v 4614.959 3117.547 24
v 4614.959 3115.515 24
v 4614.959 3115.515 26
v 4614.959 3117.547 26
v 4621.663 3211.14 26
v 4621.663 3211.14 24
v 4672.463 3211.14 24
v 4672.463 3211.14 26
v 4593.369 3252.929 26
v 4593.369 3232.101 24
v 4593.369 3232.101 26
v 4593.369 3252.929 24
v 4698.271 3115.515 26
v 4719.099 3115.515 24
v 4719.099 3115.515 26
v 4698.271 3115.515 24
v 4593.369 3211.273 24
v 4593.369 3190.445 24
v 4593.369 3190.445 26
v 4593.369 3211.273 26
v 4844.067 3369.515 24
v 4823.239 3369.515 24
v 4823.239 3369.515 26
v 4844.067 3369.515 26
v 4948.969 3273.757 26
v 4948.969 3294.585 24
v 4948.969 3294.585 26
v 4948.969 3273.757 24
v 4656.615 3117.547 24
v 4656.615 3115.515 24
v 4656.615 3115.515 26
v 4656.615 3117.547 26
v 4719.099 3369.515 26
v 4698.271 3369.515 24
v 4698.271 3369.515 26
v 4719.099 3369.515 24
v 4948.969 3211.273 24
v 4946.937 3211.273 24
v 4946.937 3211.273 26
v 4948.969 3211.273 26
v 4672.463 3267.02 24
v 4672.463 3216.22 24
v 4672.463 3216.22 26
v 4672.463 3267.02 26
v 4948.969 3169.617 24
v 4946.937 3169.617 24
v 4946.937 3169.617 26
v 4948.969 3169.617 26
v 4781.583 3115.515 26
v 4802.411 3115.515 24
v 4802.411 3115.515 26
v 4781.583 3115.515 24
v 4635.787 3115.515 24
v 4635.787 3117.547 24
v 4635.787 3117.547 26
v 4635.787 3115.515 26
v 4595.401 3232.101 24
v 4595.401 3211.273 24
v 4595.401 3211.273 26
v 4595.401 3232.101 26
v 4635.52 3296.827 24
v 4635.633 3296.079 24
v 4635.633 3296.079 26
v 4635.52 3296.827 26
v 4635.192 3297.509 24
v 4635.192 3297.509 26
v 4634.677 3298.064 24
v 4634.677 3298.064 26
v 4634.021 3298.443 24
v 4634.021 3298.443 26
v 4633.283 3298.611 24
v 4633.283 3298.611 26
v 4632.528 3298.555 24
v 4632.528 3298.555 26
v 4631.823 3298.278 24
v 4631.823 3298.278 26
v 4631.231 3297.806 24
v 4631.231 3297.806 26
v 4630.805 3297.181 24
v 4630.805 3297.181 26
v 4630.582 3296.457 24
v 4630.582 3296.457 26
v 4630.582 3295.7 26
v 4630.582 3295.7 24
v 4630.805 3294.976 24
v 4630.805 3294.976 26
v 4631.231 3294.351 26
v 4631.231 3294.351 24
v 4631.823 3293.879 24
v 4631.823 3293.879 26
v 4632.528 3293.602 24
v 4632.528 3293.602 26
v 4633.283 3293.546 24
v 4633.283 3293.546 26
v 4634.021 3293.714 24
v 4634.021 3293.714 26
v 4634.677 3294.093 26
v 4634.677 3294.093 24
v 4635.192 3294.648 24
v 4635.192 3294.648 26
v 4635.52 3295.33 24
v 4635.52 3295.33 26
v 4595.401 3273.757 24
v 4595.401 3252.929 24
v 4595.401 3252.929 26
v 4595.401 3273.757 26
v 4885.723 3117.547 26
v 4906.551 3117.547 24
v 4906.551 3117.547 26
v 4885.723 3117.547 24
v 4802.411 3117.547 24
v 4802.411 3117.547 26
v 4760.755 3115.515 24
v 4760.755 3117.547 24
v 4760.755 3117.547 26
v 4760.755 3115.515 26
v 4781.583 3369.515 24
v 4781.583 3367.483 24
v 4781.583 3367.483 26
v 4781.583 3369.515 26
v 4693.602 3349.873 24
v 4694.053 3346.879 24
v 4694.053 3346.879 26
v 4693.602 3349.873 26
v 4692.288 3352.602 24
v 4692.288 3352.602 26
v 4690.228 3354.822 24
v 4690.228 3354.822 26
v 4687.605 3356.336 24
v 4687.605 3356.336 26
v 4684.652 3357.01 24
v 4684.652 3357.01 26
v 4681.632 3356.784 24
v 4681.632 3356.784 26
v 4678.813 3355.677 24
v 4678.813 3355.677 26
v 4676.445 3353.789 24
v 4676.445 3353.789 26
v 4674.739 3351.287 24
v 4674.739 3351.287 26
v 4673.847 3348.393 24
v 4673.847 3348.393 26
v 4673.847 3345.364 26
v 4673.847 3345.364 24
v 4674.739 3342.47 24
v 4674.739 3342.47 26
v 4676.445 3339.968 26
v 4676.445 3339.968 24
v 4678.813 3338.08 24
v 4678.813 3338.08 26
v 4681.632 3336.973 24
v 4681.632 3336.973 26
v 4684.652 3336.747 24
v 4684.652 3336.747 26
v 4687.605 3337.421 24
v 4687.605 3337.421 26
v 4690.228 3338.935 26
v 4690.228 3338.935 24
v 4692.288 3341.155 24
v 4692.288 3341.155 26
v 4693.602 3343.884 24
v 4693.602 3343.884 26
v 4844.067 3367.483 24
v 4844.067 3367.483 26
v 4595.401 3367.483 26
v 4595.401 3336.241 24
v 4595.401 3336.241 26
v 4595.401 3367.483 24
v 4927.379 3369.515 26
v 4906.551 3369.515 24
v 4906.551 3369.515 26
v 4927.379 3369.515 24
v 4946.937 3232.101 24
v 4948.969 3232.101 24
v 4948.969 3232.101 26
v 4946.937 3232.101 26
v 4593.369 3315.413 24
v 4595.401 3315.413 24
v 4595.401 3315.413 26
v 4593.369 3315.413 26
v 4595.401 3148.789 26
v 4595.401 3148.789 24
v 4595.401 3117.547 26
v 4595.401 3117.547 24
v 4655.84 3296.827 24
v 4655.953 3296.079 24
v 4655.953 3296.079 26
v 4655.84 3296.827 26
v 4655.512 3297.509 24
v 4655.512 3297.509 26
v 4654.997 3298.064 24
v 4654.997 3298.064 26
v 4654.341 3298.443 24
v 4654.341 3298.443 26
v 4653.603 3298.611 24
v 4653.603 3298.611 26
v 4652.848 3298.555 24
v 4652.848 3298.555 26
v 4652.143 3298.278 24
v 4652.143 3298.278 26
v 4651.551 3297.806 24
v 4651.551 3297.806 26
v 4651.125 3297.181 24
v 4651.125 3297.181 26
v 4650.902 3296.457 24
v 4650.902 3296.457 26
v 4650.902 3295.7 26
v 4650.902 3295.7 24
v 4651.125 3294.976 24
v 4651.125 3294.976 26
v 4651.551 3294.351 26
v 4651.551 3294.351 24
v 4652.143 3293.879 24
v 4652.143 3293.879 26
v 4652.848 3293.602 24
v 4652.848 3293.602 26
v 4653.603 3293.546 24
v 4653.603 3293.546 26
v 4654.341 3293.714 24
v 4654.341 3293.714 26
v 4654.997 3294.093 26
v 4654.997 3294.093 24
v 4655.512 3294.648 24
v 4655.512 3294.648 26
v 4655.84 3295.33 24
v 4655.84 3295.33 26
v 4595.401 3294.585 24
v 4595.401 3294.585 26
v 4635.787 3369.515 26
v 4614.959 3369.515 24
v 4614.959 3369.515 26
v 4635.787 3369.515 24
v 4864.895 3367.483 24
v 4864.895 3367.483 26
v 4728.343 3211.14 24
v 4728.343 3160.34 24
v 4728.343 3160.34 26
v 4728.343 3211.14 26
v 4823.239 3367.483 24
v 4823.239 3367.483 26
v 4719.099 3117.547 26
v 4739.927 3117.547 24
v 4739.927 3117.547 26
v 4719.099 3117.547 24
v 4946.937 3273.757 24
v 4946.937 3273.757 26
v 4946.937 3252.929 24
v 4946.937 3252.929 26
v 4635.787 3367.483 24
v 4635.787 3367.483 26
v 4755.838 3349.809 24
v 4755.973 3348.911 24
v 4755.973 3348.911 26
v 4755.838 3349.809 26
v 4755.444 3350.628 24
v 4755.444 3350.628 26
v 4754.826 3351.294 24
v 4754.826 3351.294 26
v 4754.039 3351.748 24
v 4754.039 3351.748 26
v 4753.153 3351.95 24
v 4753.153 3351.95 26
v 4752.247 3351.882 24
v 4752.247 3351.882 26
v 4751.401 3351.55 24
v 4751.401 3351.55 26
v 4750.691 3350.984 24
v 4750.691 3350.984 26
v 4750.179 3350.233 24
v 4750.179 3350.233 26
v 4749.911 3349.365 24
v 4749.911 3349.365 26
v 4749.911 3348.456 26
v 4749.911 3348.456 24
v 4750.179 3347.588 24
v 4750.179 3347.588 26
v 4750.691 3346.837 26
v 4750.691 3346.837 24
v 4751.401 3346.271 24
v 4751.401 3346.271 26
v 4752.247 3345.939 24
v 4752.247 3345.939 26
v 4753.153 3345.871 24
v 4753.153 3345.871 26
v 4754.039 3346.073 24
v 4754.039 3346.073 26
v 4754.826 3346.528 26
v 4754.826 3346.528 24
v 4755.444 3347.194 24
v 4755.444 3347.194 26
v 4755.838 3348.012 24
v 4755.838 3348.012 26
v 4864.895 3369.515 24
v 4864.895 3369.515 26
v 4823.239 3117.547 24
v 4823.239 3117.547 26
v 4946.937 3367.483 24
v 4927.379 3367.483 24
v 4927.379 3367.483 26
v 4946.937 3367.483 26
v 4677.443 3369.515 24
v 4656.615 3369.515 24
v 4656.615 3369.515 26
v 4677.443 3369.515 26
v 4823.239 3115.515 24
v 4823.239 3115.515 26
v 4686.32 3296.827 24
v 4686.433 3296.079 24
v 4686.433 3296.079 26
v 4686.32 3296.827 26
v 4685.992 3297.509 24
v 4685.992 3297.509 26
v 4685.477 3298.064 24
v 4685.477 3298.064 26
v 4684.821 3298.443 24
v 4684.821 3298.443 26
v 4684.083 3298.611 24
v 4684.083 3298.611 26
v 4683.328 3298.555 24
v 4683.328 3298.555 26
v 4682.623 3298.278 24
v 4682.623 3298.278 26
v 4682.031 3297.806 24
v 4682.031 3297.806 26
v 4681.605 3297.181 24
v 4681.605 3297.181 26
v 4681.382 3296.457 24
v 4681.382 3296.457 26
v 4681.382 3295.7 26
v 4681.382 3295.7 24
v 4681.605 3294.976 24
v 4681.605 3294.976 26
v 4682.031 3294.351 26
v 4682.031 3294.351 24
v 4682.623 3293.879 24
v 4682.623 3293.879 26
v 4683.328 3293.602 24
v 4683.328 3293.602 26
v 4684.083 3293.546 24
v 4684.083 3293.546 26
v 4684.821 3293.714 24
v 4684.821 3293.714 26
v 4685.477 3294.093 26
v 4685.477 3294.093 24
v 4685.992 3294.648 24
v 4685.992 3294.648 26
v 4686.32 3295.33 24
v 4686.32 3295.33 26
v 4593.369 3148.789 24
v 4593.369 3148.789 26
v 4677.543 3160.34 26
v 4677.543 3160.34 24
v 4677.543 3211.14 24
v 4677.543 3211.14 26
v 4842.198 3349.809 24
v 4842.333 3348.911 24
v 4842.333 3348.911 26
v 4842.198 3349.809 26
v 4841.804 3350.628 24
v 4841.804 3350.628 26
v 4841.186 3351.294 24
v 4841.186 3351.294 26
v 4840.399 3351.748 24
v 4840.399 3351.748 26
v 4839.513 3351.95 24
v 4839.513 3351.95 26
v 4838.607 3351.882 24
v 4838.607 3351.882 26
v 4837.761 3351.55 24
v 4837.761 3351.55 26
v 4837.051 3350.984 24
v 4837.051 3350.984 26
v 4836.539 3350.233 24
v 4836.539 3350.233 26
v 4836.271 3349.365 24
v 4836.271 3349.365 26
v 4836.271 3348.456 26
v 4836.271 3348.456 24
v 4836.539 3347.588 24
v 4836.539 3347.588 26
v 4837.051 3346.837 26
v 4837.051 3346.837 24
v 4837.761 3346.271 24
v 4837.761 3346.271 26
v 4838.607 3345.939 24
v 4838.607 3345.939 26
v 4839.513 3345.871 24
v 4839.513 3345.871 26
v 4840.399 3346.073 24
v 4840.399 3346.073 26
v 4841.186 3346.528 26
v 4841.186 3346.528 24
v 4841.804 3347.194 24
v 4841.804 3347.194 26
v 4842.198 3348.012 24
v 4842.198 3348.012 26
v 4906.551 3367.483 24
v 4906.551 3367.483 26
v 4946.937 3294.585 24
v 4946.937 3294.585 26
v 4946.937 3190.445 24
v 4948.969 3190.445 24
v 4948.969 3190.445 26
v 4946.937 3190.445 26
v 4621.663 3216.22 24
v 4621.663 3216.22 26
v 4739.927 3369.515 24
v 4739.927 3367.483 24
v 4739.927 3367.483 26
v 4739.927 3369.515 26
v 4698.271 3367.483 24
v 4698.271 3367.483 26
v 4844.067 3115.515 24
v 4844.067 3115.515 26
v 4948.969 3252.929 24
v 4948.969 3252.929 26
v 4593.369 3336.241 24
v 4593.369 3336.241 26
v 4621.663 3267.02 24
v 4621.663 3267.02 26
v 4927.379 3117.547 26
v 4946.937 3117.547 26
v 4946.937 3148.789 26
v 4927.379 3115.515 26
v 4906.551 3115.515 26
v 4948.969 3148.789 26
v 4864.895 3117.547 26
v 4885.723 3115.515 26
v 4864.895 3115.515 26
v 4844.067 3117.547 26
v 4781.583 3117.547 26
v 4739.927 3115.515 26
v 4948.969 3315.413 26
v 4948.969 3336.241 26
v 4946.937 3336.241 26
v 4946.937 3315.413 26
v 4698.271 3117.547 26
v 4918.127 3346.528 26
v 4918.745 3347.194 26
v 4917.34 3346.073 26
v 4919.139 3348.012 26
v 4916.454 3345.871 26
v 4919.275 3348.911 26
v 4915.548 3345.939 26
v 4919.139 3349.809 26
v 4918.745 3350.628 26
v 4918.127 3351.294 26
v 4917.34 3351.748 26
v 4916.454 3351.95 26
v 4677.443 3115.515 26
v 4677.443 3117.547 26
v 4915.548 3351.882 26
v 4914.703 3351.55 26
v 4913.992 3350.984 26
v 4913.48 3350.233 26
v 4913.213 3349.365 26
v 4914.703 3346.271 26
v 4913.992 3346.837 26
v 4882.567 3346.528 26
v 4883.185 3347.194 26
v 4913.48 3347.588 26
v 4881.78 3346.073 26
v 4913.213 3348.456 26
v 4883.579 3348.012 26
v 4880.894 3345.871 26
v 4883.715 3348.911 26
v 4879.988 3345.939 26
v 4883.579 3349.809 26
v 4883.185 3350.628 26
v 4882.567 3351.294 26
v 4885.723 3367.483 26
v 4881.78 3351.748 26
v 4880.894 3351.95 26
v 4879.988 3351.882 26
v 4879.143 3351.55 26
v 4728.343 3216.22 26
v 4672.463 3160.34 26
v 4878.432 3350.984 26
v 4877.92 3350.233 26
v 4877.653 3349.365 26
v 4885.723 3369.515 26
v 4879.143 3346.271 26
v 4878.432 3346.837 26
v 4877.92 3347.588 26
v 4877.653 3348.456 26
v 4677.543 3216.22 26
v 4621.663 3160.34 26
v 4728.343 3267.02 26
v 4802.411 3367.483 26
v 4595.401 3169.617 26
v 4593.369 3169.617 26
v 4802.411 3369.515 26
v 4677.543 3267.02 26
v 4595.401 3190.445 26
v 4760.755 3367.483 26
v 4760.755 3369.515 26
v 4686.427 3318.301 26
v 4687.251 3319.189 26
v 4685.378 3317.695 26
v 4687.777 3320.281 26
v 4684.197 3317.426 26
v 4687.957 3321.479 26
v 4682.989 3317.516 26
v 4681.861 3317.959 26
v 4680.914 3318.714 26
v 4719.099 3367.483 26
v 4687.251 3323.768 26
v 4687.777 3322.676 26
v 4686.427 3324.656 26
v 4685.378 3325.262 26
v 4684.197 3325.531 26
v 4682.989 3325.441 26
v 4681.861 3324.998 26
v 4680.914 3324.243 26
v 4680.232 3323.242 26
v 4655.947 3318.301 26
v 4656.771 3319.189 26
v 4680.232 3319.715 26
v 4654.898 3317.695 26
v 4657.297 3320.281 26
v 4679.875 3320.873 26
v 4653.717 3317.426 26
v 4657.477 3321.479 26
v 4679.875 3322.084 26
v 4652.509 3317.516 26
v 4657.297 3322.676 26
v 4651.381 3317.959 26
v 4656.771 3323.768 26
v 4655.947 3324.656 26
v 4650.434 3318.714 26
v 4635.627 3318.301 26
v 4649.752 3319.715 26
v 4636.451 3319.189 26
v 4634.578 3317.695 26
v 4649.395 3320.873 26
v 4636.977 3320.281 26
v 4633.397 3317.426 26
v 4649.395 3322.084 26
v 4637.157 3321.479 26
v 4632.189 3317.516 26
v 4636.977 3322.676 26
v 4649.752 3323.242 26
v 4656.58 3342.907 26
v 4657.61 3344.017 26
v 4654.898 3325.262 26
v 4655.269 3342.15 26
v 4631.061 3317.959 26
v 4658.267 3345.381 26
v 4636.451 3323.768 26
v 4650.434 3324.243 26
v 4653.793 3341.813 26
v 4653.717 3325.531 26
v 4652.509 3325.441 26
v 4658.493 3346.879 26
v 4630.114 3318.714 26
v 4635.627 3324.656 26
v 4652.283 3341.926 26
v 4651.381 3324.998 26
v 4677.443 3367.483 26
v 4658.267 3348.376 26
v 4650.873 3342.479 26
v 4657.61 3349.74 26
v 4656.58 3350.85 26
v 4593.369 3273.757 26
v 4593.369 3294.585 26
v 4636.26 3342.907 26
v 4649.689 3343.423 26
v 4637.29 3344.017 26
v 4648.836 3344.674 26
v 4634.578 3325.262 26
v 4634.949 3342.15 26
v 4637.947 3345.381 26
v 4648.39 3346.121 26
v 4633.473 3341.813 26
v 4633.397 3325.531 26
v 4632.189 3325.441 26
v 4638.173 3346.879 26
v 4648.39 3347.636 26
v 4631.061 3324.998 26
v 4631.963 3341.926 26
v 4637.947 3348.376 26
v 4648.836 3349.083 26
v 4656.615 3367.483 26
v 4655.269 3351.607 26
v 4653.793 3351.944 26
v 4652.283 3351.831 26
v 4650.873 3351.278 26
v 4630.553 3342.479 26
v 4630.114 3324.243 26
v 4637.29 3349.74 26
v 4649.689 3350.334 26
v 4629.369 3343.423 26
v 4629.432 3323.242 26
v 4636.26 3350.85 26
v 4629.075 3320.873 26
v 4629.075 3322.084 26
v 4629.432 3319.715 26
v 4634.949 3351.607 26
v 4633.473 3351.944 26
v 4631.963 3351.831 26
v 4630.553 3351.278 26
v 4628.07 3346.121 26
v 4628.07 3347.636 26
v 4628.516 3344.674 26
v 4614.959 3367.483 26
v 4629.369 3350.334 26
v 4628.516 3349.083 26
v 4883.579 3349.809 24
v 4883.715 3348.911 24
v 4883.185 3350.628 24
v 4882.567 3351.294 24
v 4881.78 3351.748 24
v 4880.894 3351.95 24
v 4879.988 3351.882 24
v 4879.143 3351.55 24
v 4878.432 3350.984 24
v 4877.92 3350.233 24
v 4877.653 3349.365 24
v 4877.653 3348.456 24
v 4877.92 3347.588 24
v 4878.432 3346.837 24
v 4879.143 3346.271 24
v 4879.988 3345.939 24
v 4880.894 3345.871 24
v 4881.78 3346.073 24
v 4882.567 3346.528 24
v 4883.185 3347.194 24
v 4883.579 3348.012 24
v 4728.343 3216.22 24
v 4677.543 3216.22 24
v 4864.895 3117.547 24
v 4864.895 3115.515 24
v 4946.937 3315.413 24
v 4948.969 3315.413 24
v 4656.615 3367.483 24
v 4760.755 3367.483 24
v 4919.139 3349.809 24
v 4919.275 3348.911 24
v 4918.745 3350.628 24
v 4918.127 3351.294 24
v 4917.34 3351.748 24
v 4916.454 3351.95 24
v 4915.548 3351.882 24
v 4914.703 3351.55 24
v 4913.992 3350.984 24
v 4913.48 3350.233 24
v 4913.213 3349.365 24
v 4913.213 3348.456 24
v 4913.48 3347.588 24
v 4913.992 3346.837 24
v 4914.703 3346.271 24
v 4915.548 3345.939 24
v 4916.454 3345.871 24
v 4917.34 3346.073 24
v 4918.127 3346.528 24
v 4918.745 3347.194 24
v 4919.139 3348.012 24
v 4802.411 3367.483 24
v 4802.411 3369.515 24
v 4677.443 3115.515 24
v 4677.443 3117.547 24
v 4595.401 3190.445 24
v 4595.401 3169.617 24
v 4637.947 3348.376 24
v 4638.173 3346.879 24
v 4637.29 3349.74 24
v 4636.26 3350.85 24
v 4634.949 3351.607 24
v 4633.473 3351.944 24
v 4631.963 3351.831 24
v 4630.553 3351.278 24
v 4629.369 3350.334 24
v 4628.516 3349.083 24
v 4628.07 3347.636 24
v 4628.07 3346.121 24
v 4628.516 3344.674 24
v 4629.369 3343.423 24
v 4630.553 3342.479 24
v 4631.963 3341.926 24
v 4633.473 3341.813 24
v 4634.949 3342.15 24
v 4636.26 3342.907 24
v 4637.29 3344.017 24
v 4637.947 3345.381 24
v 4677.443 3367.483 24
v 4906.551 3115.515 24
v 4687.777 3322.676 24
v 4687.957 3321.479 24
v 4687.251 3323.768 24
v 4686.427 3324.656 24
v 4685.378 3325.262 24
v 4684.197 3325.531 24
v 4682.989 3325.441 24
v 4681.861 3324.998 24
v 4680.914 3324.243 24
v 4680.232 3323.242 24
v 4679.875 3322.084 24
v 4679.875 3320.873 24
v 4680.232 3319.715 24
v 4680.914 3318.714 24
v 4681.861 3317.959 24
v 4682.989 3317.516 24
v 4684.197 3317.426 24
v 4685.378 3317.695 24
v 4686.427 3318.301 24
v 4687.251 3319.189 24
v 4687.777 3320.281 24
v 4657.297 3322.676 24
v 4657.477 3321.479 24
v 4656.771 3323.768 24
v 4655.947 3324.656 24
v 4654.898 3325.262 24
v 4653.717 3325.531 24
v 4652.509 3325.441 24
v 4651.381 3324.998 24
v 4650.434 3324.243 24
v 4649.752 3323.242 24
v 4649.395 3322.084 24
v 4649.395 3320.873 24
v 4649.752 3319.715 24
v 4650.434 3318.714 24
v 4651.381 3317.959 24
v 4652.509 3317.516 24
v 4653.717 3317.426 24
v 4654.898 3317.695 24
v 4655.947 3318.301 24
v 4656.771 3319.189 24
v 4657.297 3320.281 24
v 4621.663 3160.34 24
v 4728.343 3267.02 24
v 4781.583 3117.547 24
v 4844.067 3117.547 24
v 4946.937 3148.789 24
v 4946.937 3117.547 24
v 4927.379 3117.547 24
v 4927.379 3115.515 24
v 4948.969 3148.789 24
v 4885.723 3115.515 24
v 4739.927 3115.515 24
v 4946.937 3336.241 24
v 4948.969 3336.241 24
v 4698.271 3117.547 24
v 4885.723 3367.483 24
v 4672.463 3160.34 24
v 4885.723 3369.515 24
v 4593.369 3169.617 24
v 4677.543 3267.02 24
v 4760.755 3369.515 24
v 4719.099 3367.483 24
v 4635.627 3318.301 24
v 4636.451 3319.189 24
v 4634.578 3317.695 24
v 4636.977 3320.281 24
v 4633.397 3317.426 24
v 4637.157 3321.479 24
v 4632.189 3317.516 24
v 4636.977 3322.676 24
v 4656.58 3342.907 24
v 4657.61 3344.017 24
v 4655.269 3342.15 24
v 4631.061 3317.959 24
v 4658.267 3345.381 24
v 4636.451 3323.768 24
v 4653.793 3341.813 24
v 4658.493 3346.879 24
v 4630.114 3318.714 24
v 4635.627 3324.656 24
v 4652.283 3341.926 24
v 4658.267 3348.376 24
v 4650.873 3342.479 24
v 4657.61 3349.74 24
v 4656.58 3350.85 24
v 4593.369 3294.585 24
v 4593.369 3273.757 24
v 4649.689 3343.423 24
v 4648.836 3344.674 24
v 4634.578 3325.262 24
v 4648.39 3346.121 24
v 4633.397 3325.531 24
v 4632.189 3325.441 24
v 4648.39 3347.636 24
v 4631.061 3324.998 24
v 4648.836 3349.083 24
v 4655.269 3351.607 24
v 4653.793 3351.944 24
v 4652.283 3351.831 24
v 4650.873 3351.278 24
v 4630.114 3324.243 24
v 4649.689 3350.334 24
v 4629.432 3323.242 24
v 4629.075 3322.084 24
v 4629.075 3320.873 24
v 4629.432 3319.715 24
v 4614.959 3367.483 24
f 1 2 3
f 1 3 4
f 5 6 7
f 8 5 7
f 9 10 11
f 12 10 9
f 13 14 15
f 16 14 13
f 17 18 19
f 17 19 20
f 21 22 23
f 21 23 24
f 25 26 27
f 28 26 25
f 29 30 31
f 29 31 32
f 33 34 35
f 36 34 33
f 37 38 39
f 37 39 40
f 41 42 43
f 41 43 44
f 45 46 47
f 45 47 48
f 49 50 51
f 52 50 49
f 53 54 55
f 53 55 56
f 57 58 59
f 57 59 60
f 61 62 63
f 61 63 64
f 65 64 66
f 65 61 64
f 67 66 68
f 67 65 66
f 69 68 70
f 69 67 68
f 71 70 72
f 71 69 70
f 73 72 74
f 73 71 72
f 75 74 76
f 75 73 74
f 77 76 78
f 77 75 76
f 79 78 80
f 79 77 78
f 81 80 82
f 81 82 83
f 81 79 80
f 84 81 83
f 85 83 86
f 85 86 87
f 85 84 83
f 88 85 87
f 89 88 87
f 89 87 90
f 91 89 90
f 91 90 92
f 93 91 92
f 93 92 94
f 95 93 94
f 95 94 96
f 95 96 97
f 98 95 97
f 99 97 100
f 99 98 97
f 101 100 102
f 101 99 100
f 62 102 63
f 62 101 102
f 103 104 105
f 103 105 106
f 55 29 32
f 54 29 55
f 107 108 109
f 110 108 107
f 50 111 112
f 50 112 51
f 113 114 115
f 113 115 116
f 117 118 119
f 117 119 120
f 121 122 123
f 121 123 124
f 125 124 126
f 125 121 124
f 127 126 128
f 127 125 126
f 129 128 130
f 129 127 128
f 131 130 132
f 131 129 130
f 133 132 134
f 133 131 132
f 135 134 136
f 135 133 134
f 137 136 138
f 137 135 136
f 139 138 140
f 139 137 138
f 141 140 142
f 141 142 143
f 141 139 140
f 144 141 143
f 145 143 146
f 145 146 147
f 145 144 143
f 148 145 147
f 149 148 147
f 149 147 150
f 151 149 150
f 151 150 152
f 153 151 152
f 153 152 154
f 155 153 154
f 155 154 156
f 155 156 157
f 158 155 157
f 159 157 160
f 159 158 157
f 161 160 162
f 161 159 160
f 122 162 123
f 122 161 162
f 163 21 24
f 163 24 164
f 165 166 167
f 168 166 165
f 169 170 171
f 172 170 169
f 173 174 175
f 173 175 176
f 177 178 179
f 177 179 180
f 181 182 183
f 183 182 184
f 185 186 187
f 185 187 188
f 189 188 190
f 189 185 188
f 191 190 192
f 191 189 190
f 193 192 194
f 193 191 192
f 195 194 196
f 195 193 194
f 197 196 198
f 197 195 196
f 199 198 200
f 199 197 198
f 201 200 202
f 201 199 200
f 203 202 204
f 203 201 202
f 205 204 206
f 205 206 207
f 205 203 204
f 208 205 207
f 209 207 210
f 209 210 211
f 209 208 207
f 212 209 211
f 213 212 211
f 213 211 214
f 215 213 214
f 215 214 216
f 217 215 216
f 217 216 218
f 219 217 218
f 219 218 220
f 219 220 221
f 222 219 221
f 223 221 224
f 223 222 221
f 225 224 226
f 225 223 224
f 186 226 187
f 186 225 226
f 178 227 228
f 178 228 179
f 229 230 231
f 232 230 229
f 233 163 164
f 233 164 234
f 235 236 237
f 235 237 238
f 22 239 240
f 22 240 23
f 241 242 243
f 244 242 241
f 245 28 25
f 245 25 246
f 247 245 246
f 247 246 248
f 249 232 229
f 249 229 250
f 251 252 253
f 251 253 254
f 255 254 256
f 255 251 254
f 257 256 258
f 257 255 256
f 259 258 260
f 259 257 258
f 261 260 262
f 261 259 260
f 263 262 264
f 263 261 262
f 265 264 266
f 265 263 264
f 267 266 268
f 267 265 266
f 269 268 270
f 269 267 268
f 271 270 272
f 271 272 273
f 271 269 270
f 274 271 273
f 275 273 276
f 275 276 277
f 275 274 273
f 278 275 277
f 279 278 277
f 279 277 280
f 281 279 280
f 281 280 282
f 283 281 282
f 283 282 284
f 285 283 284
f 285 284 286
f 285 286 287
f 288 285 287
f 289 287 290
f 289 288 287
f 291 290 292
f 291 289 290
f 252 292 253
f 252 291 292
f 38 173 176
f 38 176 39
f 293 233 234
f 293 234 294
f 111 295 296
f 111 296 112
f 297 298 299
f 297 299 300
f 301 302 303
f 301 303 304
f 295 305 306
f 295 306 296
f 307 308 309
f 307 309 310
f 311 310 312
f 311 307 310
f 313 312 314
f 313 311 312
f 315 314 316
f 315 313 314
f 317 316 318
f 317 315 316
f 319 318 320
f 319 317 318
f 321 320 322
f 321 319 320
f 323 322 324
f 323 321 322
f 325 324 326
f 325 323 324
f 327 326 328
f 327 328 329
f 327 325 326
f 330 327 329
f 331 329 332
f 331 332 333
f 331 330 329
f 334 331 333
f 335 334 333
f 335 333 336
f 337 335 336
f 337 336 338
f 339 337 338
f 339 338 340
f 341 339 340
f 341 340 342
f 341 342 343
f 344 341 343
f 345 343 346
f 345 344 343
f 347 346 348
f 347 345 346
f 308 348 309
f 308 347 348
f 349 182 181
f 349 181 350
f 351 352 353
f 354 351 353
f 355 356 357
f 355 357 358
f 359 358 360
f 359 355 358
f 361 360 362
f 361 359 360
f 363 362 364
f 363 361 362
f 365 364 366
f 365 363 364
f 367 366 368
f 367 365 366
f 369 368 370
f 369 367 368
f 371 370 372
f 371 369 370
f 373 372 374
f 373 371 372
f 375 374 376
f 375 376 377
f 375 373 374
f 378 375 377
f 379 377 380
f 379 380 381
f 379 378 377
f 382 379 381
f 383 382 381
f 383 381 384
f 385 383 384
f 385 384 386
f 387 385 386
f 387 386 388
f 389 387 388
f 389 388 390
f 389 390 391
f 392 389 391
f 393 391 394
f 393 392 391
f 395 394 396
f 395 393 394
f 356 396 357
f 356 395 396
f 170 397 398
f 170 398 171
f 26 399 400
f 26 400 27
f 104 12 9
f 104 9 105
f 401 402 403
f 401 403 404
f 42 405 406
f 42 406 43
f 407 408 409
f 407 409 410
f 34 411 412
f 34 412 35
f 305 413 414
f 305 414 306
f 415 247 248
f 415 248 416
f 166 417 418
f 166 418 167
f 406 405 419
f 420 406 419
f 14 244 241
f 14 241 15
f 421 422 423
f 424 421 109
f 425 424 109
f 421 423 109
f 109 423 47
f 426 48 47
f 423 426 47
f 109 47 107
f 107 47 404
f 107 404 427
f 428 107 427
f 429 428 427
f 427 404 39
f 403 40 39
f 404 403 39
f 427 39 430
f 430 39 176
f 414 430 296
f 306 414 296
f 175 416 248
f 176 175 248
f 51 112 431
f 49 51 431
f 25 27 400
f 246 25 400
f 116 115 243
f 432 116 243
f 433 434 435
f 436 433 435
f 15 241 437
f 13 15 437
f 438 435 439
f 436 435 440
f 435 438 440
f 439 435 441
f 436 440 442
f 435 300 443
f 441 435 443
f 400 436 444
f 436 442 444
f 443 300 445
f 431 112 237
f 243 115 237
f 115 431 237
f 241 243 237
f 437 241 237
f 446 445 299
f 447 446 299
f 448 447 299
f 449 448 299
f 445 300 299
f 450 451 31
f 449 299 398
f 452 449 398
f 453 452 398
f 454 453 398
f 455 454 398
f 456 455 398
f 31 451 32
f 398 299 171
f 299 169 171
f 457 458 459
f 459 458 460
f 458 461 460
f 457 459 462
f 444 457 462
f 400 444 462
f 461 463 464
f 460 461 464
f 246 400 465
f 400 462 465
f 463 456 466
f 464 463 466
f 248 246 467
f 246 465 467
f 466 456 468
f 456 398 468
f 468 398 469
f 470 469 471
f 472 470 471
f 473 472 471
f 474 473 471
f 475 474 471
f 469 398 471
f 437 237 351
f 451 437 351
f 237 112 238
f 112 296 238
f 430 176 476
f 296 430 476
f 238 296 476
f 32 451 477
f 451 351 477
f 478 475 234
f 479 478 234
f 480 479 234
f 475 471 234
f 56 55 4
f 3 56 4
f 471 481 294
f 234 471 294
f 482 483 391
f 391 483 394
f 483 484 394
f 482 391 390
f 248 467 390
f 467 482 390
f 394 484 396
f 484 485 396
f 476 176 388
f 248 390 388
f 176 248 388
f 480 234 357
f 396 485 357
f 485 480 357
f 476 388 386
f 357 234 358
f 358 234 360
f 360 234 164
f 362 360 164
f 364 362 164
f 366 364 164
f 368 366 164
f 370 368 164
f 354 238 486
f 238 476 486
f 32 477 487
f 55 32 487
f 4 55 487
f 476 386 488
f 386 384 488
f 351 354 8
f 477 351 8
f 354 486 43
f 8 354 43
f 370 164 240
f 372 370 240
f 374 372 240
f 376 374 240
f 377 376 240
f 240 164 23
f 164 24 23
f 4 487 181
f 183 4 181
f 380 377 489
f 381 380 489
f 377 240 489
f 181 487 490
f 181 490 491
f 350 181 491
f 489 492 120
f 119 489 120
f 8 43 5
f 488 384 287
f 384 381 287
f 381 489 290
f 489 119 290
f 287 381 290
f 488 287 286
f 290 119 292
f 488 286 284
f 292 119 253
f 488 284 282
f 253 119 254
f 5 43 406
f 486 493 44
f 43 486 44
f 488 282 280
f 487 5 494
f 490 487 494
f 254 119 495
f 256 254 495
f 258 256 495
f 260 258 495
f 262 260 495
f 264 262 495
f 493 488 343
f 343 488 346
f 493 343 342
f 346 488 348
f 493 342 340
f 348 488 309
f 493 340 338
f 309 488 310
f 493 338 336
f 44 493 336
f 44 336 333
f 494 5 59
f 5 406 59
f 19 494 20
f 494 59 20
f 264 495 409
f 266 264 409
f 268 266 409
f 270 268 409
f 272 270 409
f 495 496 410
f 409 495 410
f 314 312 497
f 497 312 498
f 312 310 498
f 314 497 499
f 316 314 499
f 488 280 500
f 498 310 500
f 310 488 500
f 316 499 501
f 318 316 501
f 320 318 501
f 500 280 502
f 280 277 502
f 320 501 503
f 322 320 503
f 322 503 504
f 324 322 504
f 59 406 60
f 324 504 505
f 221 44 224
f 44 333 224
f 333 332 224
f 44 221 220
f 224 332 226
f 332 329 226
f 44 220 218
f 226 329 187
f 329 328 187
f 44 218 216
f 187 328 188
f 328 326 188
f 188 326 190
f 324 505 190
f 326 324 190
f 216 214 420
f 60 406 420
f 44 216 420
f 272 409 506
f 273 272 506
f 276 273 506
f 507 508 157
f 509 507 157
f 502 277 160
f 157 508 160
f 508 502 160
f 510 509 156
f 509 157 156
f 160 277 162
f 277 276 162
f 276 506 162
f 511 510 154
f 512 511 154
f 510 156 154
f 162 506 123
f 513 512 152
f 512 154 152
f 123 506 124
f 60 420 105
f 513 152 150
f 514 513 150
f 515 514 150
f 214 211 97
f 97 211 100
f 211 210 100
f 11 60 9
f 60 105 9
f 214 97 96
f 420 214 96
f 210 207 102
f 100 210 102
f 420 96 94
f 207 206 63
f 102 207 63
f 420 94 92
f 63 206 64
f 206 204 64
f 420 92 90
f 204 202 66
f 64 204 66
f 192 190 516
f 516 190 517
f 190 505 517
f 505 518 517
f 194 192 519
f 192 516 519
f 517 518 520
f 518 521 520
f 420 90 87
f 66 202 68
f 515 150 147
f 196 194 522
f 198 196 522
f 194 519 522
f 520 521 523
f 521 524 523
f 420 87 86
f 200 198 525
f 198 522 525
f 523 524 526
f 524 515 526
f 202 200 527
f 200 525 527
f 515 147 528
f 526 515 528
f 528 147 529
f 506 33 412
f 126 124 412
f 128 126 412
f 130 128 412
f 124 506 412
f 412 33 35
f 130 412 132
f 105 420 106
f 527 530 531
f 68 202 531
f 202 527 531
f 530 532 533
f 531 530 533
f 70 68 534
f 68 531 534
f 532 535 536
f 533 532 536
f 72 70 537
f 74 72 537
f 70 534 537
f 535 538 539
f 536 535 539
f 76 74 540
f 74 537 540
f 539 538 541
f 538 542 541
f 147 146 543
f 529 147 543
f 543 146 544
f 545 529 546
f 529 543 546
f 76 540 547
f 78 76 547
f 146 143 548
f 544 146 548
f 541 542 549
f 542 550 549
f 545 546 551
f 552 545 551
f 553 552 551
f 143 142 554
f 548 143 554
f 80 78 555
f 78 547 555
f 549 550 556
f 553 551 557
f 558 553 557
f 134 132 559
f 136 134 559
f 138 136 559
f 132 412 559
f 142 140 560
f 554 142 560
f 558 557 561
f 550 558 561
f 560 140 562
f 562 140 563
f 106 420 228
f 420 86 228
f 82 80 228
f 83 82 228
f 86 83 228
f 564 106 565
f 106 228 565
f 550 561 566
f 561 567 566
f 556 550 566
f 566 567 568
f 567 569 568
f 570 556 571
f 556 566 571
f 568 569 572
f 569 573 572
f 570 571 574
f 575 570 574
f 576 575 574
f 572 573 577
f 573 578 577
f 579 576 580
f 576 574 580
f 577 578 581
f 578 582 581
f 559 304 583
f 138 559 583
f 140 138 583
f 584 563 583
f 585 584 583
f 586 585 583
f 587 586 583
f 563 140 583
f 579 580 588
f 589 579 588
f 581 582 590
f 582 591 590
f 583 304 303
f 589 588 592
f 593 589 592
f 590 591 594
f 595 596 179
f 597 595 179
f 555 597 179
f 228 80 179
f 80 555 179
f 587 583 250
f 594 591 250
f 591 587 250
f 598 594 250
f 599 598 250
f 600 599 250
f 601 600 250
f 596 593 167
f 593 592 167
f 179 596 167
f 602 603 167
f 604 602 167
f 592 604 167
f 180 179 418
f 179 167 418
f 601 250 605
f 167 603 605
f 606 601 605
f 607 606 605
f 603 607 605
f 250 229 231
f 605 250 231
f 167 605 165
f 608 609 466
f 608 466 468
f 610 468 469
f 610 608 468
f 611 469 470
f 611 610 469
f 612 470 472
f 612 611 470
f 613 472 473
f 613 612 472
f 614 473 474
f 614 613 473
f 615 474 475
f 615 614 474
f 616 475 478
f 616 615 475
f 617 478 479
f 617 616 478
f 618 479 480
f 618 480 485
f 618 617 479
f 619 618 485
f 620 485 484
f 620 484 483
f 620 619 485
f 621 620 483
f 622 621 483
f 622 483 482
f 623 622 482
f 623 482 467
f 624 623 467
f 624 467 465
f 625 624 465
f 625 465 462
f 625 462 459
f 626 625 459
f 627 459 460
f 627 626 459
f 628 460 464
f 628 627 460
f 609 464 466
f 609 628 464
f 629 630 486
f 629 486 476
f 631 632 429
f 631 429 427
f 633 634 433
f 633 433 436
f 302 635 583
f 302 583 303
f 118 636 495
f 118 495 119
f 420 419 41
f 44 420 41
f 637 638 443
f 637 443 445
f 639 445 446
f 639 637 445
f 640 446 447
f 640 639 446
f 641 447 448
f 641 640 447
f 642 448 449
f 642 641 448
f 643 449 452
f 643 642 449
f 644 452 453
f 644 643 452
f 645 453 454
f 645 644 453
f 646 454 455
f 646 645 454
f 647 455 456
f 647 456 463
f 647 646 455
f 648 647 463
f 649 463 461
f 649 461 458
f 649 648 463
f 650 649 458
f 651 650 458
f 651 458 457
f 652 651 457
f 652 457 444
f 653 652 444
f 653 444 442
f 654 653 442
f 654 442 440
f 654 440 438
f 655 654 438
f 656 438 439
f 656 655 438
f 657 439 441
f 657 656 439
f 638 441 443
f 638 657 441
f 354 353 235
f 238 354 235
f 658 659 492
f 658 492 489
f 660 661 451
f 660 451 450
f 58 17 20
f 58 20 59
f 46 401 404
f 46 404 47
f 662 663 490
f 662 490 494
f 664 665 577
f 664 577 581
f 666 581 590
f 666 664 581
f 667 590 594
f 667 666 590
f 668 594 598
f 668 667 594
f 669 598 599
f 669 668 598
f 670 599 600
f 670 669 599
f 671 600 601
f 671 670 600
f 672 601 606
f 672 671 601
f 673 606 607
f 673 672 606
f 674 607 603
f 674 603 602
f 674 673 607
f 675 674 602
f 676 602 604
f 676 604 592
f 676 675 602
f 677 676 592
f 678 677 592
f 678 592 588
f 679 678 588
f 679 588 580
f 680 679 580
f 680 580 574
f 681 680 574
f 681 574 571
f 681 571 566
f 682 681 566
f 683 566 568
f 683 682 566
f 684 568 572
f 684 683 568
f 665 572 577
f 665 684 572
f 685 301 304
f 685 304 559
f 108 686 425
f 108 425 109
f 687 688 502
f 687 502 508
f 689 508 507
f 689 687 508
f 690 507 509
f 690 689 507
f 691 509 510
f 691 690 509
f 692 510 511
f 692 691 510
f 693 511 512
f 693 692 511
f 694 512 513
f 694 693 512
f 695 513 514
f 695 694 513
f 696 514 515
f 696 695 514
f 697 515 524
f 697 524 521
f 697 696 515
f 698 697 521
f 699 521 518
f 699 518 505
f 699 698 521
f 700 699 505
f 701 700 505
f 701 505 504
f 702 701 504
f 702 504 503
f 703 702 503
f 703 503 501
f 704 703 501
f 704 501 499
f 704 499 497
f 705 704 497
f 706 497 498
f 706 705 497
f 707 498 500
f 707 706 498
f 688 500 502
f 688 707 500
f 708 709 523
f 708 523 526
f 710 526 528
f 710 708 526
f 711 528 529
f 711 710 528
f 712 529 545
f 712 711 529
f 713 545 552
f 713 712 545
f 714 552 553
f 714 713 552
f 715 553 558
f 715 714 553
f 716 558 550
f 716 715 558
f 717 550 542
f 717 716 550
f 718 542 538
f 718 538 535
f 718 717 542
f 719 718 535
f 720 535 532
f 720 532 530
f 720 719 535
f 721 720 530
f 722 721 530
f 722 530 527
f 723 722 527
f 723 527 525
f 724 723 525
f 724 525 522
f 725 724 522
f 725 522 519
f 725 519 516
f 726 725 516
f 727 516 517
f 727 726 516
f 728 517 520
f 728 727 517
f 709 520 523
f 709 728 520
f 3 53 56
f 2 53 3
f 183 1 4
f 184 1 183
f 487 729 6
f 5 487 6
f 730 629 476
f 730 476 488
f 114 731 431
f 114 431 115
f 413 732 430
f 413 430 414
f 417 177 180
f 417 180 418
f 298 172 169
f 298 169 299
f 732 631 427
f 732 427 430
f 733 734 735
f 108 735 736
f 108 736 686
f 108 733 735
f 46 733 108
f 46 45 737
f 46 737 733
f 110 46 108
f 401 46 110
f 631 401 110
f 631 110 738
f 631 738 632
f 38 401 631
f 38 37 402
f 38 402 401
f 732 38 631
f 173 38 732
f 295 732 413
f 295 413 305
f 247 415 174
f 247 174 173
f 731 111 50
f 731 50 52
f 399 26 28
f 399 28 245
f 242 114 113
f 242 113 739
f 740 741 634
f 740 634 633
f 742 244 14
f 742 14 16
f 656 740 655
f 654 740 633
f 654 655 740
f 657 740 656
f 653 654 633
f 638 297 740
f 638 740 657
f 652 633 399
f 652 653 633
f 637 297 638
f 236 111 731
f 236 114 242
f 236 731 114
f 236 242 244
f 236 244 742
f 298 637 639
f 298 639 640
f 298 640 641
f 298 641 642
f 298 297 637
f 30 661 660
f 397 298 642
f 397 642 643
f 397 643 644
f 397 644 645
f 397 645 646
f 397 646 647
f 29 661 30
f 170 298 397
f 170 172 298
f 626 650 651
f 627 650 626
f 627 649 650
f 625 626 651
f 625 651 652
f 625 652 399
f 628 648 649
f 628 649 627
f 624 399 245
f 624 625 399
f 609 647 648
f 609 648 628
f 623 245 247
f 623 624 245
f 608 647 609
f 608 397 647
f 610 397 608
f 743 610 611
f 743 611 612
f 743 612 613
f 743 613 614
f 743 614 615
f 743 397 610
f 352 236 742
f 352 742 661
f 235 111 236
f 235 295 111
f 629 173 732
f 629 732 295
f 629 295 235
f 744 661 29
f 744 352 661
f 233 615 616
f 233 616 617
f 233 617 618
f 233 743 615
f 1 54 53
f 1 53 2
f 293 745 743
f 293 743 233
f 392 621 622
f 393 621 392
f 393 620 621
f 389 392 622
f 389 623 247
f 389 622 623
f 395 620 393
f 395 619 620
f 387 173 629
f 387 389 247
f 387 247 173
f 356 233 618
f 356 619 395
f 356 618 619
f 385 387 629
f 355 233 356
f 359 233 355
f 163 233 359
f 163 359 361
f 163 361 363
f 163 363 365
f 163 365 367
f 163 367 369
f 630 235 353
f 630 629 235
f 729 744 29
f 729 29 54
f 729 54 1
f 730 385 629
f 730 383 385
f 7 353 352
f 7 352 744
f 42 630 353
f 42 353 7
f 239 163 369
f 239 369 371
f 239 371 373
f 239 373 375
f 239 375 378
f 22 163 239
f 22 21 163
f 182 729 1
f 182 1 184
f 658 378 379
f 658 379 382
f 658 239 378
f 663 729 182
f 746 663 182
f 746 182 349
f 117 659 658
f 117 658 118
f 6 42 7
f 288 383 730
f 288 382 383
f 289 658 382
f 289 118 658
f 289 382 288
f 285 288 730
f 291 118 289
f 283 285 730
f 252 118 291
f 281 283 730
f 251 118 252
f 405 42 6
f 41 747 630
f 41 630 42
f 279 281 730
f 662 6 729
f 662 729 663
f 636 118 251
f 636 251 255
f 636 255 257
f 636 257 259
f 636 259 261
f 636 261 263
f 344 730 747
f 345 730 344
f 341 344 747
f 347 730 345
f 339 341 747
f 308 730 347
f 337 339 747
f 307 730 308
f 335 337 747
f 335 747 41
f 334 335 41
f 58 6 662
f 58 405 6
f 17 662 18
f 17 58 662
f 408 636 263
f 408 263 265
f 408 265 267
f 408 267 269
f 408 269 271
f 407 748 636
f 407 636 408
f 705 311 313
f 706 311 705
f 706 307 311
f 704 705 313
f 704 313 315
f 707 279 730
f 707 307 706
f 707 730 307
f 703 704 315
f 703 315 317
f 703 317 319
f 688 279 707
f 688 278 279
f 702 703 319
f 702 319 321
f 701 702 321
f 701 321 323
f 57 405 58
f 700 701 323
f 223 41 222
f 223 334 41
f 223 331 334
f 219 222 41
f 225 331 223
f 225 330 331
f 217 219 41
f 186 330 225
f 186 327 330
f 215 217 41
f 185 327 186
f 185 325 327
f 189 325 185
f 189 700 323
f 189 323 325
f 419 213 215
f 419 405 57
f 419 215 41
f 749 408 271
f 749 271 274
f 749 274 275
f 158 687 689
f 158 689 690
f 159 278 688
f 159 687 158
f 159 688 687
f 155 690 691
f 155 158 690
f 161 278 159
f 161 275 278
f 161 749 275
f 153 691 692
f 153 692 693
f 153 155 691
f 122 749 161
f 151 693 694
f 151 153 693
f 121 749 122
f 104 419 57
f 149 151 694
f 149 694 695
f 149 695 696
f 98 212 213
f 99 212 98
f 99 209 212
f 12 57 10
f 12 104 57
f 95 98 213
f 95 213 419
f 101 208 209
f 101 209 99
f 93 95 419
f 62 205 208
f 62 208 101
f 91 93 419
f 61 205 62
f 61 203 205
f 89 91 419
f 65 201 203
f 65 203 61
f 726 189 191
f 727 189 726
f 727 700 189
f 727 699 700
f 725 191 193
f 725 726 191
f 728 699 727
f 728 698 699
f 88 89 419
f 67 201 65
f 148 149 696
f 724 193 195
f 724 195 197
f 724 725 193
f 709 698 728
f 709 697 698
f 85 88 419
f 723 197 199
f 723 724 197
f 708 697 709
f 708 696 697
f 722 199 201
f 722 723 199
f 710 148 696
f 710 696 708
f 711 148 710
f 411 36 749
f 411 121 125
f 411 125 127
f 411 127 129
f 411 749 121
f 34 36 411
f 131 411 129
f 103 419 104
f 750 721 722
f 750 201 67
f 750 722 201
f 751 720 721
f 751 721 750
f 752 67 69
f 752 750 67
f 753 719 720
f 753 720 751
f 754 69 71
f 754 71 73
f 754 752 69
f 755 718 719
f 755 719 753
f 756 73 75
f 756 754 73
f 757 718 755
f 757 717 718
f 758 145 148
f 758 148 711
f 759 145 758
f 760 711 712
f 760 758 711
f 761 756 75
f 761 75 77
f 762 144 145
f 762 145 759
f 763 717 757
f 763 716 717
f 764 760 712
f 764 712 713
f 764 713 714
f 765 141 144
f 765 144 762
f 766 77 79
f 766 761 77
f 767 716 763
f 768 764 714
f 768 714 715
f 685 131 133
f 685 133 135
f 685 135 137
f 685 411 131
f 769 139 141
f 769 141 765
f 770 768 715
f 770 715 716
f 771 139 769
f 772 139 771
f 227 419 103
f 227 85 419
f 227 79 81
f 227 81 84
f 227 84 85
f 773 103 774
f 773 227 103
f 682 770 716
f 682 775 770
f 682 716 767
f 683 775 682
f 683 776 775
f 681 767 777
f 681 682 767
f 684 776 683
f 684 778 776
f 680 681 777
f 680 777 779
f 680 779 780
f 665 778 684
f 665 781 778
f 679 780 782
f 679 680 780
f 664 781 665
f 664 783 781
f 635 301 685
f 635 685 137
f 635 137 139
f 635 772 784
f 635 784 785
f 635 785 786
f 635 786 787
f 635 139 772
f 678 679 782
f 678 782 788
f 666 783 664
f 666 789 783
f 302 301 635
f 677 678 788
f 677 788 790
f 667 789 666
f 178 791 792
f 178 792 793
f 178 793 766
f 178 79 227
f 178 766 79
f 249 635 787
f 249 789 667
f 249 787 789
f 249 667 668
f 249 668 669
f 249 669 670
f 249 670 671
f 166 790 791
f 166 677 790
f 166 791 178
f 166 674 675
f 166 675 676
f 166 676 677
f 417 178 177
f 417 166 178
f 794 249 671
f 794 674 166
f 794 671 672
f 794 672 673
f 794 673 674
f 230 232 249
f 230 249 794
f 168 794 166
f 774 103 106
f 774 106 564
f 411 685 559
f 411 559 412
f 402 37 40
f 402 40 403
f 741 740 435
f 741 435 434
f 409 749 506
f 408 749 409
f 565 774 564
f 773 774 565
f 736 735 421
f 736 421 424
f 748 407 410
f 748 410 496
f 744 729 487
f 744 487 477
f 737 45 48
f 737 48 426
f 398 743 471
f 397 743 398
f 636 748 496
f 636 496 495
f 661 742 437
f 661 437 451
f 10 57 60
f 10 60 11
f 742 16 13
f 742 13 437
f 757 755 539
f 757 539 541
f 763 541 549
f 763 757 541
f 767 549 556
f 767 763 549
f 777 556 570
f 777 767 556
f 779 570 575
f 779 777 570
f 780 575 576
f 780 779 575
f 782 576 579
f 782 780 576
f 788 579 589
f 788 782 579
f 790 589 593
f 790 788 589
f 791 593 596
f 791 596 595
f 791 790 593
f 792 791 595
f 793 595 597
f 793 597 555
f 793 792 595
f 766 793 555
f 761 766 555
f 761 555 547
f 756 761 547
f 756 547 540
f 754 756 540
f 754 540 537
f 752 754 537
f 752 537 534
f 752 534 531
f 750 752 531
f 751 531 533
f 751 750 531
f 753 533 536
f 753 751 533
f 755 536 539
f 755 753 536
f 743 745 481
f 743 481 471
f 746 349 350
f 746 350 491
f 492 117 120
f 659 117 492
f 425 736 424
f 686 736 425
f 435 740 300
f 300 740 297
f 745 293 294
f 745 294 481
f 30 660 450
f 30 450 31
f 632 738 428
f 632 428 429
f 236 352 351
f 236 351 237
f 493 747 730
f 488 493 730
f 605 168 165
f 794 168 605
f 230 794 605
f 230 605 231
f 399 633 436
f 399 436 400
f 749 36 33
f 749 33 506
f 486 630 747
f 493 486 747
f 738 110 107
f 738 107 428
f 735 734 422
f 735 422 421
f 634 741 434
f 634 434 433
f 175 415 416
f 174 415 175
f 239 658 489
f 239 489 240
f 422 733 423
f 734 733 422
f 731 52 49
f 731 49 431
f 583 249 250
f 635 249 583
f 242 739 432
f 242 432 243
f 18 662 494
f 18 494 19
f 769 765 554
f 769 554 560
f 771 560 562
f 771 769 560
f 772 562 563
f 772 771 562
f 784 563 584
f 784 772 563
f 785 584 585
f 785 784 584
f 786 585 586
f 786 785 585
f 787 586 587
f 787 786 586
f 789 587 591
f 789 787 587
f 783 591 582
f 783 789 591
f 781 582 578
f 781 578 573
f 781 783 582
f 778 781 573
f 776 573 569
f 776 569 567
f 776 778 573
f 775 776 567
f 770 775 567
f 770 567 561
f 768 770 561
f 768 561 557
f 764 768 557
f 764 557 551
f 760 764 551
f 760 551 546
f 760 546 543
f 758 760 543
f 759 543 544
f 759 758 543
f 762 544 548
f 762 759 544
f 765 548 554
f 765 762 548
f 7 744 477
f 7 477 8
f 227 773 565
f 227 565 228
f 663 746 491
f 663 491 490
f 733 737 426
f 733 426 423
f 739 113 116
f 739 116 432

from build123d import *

# Parameters (mm, degrees)
SKETCH1_R           = 63.5
SKETCH1_R_2         = 76.2
SKETCH1_R_3         = 127
SKETCH1_R_4         = 101.6
SKETCH1_R_5         = 254
SKETCH1_W           = 1270
SKETCH1_H           = 1270
BOSS_EXTRUDE1_DEPTH = 50
SCALE1_SCALE        = 0.04


with BuildPart() as part:
    # Sketch1 → Boss-Extrude1 (new body)
    with BuildSketch(Plane.XY):
        Polygon((50.8, 3435.35), (50.8, 3956.05), (0, 3956.05), (0, 4476.75), (50.8, 4476.75), (50.8, 4997.45), (0, 4997.45), (0, 5518.15), (50.8, 5518.15), (50.8, 6299.2), (539.75, 6299.2), (539.75, 6350), (1060.45, 6350), (1060.45, 6299.2), (1581.15, 6299.2), (1581.15, 6350), (2101.85, 6350), (2101.85, 6299.2), (2622.55, 6299.2), (2622.55, 6350), (3143.25, 6350), (3143.25, 6299.2), (3663.95, 6299.2), (3663.95, 6350), (4184.65, 6350), (4184.65, 6299.2), (4705.35, 6299.2), (4705.35, 6350), (5226.05, 6350), (5226.05, 6299.2), (5746.75, 6299.2), (5746.75, 6350), (6267.45, 6350), (6267.45, 6299.2), (6788.15, 6299.2), (6788.15, 6350), (7308.85, 6350), (7308.85, 6299.2), (7829.55, 6299.2), (7829.55, 6350), (8350.25, 6350), (8350.25, 6299.2), (8839.2, 6299.2), (8839.2, 6038.85), (8839.2, 5518.15), (8890, 5518.15), (8890, 4997.45), (8839.2, 4997.45), (8839.2, 4476.75), (8890, 4476.75), (8890, 3956.05), (8839.2, 3956.05), (8839.2, 3435.35), (8890, 3435.35), (8890, 2914.65), (8839.2, 2914.65), (8839.2, 2393.95), (8890, 2393.95), (8890, 1873.25), (8839.2, 1873.25), (8839.2, 1352.55), (8890, 1352.55), (8890, 831.85), (8839.2, 831.85), (8839.2, 50.8), (8350.25, 50.8), (8350.25, 0), (7829.55, 0), (7829.55, 50.8), (7308.85, 50.8), (7308.85, 0), (6788.15, 0), (6788.15, 50.8), (6267.45, 50.8), (6267.45, 0), (5746.75, 0), (5746.75, 50.8), (5226.05, 50.8), (5226.05, 0), (4705.35, 0), (4705.35, 50.8), (4184.65, 50.8), (4184.65, 0), (3663.95, 0), (3663.95, 50.8), (3143.25, 50.8), (3143.25, 0), (2622.55, 0), (2622.55, 50.8), (2101.85, 50.8), (2101.85, 0), (1581.15, 0), (1581.15, 50.8), (1060.45, 50.8), (1060.45, 0), (539.75, 0), (539.75, 50.8), (50.8, 50.8), (50.8, 311.15), (50.8, 831.85), (0, 831.85), (0, 1352.55), (50.8, 1352.55), (50.8, 1873.25), (0, 1873.25), (0, 2393.95), (50.8, 2393.95), (50.8, 2914.65), (0, 2914.65), (0, 3435.35), align=None)
        with Locations((2263.093189832, 4514.095537704)):
            Circle(SKETCH1_R, mode=Mode.SUBTRACT)
        with Locations((7182.429020432, 5834.895537704)):
            Circle(SKETCH1_R_2, mode=Mode.SUBTRACT)
        with Locations((6147.900253832, 5834.895537704)):
            Circle(SKETCH1_R_2, mode=Mode.SUBTRACT)
        with Locations((8071.429020432, 5834.895537704)):
            Circle(SKETCH1_R_2, mode=Mode.SUBTRACT)
        with Locations((3988.900253832, 5834.895537704)):
            Circle(SKETCH1_R_2, mode=Mode.SUBTRACT)
        with Locations((993.093189832, 5784.095537704)):
            Circle(SKETCH1_R_3, mode=Mode.SUBTRACT)
        with Locations((993.093189832, 5149.095537704)):
            Circle(SKETCH1_R_4, mode=Mode.SUBTRACT)
        with Locations((993.093189832, 4514.095537704)):
            Circle(SKETCH1_R, mode=Mode.SUBTRACT)
        with Locations((1501.093189832, 5784.095537704)):
            Circle(SKETCH1_R_3, mode=Mode.SUBTRACT)
        with Locations((1501.093189832, 5149.095537704)):
            Circle(SKETCH1_R_4, mode=Mode.SUBTRACT)
        with Locations((1501.093189832, 4514.095537704)):
            Circle(SKETCH1_R, mode=Mode.SUBTRACT)
        with Locations((2263.093189832, 5784.095537704)):
            Circle(SKETCH1_R_5, mode=Mode.SUBTRACT)
        with Locations((2263.093189832, 5149.095537704)):
            Circle(SKETCH1_R_4, mode=Mode.SUBTRACT)
        with Locations((2739.3392, 3152.6226)):
            Rectangle(SKETCH1_W, SKETCH1_H, mode=Mode.SUBTRACT)
        with Locations((2739.3392, 1755.6226)):
            Rectangle(SKETCH1_W, SKETCH1_H, mode=Mode.SUBTRACT)
        with Locations((1342.3392, 1755.6226)):
            Rectangle(SKETCH1_W, SKETCH1_H, mode=Mode.SUBTRACT)
        with Locations((1342.3392, 3152.6226)):
            Rectangle(SKETCH1_W, SKETCH1_H, mode=Mode.SUBTRACT)
    extrude(amount=BOSS_EXTRUDE1_DEPTH)


with BuildPart() as part_1:
    # Scale1: scaled about (4784.759817545, 3245.327855947, 25)
    add(part.part.scale(SCALE1_SCALE).moved(Location((4593.369424843, 3115.514741709, 24))))


solid = part_1.part
